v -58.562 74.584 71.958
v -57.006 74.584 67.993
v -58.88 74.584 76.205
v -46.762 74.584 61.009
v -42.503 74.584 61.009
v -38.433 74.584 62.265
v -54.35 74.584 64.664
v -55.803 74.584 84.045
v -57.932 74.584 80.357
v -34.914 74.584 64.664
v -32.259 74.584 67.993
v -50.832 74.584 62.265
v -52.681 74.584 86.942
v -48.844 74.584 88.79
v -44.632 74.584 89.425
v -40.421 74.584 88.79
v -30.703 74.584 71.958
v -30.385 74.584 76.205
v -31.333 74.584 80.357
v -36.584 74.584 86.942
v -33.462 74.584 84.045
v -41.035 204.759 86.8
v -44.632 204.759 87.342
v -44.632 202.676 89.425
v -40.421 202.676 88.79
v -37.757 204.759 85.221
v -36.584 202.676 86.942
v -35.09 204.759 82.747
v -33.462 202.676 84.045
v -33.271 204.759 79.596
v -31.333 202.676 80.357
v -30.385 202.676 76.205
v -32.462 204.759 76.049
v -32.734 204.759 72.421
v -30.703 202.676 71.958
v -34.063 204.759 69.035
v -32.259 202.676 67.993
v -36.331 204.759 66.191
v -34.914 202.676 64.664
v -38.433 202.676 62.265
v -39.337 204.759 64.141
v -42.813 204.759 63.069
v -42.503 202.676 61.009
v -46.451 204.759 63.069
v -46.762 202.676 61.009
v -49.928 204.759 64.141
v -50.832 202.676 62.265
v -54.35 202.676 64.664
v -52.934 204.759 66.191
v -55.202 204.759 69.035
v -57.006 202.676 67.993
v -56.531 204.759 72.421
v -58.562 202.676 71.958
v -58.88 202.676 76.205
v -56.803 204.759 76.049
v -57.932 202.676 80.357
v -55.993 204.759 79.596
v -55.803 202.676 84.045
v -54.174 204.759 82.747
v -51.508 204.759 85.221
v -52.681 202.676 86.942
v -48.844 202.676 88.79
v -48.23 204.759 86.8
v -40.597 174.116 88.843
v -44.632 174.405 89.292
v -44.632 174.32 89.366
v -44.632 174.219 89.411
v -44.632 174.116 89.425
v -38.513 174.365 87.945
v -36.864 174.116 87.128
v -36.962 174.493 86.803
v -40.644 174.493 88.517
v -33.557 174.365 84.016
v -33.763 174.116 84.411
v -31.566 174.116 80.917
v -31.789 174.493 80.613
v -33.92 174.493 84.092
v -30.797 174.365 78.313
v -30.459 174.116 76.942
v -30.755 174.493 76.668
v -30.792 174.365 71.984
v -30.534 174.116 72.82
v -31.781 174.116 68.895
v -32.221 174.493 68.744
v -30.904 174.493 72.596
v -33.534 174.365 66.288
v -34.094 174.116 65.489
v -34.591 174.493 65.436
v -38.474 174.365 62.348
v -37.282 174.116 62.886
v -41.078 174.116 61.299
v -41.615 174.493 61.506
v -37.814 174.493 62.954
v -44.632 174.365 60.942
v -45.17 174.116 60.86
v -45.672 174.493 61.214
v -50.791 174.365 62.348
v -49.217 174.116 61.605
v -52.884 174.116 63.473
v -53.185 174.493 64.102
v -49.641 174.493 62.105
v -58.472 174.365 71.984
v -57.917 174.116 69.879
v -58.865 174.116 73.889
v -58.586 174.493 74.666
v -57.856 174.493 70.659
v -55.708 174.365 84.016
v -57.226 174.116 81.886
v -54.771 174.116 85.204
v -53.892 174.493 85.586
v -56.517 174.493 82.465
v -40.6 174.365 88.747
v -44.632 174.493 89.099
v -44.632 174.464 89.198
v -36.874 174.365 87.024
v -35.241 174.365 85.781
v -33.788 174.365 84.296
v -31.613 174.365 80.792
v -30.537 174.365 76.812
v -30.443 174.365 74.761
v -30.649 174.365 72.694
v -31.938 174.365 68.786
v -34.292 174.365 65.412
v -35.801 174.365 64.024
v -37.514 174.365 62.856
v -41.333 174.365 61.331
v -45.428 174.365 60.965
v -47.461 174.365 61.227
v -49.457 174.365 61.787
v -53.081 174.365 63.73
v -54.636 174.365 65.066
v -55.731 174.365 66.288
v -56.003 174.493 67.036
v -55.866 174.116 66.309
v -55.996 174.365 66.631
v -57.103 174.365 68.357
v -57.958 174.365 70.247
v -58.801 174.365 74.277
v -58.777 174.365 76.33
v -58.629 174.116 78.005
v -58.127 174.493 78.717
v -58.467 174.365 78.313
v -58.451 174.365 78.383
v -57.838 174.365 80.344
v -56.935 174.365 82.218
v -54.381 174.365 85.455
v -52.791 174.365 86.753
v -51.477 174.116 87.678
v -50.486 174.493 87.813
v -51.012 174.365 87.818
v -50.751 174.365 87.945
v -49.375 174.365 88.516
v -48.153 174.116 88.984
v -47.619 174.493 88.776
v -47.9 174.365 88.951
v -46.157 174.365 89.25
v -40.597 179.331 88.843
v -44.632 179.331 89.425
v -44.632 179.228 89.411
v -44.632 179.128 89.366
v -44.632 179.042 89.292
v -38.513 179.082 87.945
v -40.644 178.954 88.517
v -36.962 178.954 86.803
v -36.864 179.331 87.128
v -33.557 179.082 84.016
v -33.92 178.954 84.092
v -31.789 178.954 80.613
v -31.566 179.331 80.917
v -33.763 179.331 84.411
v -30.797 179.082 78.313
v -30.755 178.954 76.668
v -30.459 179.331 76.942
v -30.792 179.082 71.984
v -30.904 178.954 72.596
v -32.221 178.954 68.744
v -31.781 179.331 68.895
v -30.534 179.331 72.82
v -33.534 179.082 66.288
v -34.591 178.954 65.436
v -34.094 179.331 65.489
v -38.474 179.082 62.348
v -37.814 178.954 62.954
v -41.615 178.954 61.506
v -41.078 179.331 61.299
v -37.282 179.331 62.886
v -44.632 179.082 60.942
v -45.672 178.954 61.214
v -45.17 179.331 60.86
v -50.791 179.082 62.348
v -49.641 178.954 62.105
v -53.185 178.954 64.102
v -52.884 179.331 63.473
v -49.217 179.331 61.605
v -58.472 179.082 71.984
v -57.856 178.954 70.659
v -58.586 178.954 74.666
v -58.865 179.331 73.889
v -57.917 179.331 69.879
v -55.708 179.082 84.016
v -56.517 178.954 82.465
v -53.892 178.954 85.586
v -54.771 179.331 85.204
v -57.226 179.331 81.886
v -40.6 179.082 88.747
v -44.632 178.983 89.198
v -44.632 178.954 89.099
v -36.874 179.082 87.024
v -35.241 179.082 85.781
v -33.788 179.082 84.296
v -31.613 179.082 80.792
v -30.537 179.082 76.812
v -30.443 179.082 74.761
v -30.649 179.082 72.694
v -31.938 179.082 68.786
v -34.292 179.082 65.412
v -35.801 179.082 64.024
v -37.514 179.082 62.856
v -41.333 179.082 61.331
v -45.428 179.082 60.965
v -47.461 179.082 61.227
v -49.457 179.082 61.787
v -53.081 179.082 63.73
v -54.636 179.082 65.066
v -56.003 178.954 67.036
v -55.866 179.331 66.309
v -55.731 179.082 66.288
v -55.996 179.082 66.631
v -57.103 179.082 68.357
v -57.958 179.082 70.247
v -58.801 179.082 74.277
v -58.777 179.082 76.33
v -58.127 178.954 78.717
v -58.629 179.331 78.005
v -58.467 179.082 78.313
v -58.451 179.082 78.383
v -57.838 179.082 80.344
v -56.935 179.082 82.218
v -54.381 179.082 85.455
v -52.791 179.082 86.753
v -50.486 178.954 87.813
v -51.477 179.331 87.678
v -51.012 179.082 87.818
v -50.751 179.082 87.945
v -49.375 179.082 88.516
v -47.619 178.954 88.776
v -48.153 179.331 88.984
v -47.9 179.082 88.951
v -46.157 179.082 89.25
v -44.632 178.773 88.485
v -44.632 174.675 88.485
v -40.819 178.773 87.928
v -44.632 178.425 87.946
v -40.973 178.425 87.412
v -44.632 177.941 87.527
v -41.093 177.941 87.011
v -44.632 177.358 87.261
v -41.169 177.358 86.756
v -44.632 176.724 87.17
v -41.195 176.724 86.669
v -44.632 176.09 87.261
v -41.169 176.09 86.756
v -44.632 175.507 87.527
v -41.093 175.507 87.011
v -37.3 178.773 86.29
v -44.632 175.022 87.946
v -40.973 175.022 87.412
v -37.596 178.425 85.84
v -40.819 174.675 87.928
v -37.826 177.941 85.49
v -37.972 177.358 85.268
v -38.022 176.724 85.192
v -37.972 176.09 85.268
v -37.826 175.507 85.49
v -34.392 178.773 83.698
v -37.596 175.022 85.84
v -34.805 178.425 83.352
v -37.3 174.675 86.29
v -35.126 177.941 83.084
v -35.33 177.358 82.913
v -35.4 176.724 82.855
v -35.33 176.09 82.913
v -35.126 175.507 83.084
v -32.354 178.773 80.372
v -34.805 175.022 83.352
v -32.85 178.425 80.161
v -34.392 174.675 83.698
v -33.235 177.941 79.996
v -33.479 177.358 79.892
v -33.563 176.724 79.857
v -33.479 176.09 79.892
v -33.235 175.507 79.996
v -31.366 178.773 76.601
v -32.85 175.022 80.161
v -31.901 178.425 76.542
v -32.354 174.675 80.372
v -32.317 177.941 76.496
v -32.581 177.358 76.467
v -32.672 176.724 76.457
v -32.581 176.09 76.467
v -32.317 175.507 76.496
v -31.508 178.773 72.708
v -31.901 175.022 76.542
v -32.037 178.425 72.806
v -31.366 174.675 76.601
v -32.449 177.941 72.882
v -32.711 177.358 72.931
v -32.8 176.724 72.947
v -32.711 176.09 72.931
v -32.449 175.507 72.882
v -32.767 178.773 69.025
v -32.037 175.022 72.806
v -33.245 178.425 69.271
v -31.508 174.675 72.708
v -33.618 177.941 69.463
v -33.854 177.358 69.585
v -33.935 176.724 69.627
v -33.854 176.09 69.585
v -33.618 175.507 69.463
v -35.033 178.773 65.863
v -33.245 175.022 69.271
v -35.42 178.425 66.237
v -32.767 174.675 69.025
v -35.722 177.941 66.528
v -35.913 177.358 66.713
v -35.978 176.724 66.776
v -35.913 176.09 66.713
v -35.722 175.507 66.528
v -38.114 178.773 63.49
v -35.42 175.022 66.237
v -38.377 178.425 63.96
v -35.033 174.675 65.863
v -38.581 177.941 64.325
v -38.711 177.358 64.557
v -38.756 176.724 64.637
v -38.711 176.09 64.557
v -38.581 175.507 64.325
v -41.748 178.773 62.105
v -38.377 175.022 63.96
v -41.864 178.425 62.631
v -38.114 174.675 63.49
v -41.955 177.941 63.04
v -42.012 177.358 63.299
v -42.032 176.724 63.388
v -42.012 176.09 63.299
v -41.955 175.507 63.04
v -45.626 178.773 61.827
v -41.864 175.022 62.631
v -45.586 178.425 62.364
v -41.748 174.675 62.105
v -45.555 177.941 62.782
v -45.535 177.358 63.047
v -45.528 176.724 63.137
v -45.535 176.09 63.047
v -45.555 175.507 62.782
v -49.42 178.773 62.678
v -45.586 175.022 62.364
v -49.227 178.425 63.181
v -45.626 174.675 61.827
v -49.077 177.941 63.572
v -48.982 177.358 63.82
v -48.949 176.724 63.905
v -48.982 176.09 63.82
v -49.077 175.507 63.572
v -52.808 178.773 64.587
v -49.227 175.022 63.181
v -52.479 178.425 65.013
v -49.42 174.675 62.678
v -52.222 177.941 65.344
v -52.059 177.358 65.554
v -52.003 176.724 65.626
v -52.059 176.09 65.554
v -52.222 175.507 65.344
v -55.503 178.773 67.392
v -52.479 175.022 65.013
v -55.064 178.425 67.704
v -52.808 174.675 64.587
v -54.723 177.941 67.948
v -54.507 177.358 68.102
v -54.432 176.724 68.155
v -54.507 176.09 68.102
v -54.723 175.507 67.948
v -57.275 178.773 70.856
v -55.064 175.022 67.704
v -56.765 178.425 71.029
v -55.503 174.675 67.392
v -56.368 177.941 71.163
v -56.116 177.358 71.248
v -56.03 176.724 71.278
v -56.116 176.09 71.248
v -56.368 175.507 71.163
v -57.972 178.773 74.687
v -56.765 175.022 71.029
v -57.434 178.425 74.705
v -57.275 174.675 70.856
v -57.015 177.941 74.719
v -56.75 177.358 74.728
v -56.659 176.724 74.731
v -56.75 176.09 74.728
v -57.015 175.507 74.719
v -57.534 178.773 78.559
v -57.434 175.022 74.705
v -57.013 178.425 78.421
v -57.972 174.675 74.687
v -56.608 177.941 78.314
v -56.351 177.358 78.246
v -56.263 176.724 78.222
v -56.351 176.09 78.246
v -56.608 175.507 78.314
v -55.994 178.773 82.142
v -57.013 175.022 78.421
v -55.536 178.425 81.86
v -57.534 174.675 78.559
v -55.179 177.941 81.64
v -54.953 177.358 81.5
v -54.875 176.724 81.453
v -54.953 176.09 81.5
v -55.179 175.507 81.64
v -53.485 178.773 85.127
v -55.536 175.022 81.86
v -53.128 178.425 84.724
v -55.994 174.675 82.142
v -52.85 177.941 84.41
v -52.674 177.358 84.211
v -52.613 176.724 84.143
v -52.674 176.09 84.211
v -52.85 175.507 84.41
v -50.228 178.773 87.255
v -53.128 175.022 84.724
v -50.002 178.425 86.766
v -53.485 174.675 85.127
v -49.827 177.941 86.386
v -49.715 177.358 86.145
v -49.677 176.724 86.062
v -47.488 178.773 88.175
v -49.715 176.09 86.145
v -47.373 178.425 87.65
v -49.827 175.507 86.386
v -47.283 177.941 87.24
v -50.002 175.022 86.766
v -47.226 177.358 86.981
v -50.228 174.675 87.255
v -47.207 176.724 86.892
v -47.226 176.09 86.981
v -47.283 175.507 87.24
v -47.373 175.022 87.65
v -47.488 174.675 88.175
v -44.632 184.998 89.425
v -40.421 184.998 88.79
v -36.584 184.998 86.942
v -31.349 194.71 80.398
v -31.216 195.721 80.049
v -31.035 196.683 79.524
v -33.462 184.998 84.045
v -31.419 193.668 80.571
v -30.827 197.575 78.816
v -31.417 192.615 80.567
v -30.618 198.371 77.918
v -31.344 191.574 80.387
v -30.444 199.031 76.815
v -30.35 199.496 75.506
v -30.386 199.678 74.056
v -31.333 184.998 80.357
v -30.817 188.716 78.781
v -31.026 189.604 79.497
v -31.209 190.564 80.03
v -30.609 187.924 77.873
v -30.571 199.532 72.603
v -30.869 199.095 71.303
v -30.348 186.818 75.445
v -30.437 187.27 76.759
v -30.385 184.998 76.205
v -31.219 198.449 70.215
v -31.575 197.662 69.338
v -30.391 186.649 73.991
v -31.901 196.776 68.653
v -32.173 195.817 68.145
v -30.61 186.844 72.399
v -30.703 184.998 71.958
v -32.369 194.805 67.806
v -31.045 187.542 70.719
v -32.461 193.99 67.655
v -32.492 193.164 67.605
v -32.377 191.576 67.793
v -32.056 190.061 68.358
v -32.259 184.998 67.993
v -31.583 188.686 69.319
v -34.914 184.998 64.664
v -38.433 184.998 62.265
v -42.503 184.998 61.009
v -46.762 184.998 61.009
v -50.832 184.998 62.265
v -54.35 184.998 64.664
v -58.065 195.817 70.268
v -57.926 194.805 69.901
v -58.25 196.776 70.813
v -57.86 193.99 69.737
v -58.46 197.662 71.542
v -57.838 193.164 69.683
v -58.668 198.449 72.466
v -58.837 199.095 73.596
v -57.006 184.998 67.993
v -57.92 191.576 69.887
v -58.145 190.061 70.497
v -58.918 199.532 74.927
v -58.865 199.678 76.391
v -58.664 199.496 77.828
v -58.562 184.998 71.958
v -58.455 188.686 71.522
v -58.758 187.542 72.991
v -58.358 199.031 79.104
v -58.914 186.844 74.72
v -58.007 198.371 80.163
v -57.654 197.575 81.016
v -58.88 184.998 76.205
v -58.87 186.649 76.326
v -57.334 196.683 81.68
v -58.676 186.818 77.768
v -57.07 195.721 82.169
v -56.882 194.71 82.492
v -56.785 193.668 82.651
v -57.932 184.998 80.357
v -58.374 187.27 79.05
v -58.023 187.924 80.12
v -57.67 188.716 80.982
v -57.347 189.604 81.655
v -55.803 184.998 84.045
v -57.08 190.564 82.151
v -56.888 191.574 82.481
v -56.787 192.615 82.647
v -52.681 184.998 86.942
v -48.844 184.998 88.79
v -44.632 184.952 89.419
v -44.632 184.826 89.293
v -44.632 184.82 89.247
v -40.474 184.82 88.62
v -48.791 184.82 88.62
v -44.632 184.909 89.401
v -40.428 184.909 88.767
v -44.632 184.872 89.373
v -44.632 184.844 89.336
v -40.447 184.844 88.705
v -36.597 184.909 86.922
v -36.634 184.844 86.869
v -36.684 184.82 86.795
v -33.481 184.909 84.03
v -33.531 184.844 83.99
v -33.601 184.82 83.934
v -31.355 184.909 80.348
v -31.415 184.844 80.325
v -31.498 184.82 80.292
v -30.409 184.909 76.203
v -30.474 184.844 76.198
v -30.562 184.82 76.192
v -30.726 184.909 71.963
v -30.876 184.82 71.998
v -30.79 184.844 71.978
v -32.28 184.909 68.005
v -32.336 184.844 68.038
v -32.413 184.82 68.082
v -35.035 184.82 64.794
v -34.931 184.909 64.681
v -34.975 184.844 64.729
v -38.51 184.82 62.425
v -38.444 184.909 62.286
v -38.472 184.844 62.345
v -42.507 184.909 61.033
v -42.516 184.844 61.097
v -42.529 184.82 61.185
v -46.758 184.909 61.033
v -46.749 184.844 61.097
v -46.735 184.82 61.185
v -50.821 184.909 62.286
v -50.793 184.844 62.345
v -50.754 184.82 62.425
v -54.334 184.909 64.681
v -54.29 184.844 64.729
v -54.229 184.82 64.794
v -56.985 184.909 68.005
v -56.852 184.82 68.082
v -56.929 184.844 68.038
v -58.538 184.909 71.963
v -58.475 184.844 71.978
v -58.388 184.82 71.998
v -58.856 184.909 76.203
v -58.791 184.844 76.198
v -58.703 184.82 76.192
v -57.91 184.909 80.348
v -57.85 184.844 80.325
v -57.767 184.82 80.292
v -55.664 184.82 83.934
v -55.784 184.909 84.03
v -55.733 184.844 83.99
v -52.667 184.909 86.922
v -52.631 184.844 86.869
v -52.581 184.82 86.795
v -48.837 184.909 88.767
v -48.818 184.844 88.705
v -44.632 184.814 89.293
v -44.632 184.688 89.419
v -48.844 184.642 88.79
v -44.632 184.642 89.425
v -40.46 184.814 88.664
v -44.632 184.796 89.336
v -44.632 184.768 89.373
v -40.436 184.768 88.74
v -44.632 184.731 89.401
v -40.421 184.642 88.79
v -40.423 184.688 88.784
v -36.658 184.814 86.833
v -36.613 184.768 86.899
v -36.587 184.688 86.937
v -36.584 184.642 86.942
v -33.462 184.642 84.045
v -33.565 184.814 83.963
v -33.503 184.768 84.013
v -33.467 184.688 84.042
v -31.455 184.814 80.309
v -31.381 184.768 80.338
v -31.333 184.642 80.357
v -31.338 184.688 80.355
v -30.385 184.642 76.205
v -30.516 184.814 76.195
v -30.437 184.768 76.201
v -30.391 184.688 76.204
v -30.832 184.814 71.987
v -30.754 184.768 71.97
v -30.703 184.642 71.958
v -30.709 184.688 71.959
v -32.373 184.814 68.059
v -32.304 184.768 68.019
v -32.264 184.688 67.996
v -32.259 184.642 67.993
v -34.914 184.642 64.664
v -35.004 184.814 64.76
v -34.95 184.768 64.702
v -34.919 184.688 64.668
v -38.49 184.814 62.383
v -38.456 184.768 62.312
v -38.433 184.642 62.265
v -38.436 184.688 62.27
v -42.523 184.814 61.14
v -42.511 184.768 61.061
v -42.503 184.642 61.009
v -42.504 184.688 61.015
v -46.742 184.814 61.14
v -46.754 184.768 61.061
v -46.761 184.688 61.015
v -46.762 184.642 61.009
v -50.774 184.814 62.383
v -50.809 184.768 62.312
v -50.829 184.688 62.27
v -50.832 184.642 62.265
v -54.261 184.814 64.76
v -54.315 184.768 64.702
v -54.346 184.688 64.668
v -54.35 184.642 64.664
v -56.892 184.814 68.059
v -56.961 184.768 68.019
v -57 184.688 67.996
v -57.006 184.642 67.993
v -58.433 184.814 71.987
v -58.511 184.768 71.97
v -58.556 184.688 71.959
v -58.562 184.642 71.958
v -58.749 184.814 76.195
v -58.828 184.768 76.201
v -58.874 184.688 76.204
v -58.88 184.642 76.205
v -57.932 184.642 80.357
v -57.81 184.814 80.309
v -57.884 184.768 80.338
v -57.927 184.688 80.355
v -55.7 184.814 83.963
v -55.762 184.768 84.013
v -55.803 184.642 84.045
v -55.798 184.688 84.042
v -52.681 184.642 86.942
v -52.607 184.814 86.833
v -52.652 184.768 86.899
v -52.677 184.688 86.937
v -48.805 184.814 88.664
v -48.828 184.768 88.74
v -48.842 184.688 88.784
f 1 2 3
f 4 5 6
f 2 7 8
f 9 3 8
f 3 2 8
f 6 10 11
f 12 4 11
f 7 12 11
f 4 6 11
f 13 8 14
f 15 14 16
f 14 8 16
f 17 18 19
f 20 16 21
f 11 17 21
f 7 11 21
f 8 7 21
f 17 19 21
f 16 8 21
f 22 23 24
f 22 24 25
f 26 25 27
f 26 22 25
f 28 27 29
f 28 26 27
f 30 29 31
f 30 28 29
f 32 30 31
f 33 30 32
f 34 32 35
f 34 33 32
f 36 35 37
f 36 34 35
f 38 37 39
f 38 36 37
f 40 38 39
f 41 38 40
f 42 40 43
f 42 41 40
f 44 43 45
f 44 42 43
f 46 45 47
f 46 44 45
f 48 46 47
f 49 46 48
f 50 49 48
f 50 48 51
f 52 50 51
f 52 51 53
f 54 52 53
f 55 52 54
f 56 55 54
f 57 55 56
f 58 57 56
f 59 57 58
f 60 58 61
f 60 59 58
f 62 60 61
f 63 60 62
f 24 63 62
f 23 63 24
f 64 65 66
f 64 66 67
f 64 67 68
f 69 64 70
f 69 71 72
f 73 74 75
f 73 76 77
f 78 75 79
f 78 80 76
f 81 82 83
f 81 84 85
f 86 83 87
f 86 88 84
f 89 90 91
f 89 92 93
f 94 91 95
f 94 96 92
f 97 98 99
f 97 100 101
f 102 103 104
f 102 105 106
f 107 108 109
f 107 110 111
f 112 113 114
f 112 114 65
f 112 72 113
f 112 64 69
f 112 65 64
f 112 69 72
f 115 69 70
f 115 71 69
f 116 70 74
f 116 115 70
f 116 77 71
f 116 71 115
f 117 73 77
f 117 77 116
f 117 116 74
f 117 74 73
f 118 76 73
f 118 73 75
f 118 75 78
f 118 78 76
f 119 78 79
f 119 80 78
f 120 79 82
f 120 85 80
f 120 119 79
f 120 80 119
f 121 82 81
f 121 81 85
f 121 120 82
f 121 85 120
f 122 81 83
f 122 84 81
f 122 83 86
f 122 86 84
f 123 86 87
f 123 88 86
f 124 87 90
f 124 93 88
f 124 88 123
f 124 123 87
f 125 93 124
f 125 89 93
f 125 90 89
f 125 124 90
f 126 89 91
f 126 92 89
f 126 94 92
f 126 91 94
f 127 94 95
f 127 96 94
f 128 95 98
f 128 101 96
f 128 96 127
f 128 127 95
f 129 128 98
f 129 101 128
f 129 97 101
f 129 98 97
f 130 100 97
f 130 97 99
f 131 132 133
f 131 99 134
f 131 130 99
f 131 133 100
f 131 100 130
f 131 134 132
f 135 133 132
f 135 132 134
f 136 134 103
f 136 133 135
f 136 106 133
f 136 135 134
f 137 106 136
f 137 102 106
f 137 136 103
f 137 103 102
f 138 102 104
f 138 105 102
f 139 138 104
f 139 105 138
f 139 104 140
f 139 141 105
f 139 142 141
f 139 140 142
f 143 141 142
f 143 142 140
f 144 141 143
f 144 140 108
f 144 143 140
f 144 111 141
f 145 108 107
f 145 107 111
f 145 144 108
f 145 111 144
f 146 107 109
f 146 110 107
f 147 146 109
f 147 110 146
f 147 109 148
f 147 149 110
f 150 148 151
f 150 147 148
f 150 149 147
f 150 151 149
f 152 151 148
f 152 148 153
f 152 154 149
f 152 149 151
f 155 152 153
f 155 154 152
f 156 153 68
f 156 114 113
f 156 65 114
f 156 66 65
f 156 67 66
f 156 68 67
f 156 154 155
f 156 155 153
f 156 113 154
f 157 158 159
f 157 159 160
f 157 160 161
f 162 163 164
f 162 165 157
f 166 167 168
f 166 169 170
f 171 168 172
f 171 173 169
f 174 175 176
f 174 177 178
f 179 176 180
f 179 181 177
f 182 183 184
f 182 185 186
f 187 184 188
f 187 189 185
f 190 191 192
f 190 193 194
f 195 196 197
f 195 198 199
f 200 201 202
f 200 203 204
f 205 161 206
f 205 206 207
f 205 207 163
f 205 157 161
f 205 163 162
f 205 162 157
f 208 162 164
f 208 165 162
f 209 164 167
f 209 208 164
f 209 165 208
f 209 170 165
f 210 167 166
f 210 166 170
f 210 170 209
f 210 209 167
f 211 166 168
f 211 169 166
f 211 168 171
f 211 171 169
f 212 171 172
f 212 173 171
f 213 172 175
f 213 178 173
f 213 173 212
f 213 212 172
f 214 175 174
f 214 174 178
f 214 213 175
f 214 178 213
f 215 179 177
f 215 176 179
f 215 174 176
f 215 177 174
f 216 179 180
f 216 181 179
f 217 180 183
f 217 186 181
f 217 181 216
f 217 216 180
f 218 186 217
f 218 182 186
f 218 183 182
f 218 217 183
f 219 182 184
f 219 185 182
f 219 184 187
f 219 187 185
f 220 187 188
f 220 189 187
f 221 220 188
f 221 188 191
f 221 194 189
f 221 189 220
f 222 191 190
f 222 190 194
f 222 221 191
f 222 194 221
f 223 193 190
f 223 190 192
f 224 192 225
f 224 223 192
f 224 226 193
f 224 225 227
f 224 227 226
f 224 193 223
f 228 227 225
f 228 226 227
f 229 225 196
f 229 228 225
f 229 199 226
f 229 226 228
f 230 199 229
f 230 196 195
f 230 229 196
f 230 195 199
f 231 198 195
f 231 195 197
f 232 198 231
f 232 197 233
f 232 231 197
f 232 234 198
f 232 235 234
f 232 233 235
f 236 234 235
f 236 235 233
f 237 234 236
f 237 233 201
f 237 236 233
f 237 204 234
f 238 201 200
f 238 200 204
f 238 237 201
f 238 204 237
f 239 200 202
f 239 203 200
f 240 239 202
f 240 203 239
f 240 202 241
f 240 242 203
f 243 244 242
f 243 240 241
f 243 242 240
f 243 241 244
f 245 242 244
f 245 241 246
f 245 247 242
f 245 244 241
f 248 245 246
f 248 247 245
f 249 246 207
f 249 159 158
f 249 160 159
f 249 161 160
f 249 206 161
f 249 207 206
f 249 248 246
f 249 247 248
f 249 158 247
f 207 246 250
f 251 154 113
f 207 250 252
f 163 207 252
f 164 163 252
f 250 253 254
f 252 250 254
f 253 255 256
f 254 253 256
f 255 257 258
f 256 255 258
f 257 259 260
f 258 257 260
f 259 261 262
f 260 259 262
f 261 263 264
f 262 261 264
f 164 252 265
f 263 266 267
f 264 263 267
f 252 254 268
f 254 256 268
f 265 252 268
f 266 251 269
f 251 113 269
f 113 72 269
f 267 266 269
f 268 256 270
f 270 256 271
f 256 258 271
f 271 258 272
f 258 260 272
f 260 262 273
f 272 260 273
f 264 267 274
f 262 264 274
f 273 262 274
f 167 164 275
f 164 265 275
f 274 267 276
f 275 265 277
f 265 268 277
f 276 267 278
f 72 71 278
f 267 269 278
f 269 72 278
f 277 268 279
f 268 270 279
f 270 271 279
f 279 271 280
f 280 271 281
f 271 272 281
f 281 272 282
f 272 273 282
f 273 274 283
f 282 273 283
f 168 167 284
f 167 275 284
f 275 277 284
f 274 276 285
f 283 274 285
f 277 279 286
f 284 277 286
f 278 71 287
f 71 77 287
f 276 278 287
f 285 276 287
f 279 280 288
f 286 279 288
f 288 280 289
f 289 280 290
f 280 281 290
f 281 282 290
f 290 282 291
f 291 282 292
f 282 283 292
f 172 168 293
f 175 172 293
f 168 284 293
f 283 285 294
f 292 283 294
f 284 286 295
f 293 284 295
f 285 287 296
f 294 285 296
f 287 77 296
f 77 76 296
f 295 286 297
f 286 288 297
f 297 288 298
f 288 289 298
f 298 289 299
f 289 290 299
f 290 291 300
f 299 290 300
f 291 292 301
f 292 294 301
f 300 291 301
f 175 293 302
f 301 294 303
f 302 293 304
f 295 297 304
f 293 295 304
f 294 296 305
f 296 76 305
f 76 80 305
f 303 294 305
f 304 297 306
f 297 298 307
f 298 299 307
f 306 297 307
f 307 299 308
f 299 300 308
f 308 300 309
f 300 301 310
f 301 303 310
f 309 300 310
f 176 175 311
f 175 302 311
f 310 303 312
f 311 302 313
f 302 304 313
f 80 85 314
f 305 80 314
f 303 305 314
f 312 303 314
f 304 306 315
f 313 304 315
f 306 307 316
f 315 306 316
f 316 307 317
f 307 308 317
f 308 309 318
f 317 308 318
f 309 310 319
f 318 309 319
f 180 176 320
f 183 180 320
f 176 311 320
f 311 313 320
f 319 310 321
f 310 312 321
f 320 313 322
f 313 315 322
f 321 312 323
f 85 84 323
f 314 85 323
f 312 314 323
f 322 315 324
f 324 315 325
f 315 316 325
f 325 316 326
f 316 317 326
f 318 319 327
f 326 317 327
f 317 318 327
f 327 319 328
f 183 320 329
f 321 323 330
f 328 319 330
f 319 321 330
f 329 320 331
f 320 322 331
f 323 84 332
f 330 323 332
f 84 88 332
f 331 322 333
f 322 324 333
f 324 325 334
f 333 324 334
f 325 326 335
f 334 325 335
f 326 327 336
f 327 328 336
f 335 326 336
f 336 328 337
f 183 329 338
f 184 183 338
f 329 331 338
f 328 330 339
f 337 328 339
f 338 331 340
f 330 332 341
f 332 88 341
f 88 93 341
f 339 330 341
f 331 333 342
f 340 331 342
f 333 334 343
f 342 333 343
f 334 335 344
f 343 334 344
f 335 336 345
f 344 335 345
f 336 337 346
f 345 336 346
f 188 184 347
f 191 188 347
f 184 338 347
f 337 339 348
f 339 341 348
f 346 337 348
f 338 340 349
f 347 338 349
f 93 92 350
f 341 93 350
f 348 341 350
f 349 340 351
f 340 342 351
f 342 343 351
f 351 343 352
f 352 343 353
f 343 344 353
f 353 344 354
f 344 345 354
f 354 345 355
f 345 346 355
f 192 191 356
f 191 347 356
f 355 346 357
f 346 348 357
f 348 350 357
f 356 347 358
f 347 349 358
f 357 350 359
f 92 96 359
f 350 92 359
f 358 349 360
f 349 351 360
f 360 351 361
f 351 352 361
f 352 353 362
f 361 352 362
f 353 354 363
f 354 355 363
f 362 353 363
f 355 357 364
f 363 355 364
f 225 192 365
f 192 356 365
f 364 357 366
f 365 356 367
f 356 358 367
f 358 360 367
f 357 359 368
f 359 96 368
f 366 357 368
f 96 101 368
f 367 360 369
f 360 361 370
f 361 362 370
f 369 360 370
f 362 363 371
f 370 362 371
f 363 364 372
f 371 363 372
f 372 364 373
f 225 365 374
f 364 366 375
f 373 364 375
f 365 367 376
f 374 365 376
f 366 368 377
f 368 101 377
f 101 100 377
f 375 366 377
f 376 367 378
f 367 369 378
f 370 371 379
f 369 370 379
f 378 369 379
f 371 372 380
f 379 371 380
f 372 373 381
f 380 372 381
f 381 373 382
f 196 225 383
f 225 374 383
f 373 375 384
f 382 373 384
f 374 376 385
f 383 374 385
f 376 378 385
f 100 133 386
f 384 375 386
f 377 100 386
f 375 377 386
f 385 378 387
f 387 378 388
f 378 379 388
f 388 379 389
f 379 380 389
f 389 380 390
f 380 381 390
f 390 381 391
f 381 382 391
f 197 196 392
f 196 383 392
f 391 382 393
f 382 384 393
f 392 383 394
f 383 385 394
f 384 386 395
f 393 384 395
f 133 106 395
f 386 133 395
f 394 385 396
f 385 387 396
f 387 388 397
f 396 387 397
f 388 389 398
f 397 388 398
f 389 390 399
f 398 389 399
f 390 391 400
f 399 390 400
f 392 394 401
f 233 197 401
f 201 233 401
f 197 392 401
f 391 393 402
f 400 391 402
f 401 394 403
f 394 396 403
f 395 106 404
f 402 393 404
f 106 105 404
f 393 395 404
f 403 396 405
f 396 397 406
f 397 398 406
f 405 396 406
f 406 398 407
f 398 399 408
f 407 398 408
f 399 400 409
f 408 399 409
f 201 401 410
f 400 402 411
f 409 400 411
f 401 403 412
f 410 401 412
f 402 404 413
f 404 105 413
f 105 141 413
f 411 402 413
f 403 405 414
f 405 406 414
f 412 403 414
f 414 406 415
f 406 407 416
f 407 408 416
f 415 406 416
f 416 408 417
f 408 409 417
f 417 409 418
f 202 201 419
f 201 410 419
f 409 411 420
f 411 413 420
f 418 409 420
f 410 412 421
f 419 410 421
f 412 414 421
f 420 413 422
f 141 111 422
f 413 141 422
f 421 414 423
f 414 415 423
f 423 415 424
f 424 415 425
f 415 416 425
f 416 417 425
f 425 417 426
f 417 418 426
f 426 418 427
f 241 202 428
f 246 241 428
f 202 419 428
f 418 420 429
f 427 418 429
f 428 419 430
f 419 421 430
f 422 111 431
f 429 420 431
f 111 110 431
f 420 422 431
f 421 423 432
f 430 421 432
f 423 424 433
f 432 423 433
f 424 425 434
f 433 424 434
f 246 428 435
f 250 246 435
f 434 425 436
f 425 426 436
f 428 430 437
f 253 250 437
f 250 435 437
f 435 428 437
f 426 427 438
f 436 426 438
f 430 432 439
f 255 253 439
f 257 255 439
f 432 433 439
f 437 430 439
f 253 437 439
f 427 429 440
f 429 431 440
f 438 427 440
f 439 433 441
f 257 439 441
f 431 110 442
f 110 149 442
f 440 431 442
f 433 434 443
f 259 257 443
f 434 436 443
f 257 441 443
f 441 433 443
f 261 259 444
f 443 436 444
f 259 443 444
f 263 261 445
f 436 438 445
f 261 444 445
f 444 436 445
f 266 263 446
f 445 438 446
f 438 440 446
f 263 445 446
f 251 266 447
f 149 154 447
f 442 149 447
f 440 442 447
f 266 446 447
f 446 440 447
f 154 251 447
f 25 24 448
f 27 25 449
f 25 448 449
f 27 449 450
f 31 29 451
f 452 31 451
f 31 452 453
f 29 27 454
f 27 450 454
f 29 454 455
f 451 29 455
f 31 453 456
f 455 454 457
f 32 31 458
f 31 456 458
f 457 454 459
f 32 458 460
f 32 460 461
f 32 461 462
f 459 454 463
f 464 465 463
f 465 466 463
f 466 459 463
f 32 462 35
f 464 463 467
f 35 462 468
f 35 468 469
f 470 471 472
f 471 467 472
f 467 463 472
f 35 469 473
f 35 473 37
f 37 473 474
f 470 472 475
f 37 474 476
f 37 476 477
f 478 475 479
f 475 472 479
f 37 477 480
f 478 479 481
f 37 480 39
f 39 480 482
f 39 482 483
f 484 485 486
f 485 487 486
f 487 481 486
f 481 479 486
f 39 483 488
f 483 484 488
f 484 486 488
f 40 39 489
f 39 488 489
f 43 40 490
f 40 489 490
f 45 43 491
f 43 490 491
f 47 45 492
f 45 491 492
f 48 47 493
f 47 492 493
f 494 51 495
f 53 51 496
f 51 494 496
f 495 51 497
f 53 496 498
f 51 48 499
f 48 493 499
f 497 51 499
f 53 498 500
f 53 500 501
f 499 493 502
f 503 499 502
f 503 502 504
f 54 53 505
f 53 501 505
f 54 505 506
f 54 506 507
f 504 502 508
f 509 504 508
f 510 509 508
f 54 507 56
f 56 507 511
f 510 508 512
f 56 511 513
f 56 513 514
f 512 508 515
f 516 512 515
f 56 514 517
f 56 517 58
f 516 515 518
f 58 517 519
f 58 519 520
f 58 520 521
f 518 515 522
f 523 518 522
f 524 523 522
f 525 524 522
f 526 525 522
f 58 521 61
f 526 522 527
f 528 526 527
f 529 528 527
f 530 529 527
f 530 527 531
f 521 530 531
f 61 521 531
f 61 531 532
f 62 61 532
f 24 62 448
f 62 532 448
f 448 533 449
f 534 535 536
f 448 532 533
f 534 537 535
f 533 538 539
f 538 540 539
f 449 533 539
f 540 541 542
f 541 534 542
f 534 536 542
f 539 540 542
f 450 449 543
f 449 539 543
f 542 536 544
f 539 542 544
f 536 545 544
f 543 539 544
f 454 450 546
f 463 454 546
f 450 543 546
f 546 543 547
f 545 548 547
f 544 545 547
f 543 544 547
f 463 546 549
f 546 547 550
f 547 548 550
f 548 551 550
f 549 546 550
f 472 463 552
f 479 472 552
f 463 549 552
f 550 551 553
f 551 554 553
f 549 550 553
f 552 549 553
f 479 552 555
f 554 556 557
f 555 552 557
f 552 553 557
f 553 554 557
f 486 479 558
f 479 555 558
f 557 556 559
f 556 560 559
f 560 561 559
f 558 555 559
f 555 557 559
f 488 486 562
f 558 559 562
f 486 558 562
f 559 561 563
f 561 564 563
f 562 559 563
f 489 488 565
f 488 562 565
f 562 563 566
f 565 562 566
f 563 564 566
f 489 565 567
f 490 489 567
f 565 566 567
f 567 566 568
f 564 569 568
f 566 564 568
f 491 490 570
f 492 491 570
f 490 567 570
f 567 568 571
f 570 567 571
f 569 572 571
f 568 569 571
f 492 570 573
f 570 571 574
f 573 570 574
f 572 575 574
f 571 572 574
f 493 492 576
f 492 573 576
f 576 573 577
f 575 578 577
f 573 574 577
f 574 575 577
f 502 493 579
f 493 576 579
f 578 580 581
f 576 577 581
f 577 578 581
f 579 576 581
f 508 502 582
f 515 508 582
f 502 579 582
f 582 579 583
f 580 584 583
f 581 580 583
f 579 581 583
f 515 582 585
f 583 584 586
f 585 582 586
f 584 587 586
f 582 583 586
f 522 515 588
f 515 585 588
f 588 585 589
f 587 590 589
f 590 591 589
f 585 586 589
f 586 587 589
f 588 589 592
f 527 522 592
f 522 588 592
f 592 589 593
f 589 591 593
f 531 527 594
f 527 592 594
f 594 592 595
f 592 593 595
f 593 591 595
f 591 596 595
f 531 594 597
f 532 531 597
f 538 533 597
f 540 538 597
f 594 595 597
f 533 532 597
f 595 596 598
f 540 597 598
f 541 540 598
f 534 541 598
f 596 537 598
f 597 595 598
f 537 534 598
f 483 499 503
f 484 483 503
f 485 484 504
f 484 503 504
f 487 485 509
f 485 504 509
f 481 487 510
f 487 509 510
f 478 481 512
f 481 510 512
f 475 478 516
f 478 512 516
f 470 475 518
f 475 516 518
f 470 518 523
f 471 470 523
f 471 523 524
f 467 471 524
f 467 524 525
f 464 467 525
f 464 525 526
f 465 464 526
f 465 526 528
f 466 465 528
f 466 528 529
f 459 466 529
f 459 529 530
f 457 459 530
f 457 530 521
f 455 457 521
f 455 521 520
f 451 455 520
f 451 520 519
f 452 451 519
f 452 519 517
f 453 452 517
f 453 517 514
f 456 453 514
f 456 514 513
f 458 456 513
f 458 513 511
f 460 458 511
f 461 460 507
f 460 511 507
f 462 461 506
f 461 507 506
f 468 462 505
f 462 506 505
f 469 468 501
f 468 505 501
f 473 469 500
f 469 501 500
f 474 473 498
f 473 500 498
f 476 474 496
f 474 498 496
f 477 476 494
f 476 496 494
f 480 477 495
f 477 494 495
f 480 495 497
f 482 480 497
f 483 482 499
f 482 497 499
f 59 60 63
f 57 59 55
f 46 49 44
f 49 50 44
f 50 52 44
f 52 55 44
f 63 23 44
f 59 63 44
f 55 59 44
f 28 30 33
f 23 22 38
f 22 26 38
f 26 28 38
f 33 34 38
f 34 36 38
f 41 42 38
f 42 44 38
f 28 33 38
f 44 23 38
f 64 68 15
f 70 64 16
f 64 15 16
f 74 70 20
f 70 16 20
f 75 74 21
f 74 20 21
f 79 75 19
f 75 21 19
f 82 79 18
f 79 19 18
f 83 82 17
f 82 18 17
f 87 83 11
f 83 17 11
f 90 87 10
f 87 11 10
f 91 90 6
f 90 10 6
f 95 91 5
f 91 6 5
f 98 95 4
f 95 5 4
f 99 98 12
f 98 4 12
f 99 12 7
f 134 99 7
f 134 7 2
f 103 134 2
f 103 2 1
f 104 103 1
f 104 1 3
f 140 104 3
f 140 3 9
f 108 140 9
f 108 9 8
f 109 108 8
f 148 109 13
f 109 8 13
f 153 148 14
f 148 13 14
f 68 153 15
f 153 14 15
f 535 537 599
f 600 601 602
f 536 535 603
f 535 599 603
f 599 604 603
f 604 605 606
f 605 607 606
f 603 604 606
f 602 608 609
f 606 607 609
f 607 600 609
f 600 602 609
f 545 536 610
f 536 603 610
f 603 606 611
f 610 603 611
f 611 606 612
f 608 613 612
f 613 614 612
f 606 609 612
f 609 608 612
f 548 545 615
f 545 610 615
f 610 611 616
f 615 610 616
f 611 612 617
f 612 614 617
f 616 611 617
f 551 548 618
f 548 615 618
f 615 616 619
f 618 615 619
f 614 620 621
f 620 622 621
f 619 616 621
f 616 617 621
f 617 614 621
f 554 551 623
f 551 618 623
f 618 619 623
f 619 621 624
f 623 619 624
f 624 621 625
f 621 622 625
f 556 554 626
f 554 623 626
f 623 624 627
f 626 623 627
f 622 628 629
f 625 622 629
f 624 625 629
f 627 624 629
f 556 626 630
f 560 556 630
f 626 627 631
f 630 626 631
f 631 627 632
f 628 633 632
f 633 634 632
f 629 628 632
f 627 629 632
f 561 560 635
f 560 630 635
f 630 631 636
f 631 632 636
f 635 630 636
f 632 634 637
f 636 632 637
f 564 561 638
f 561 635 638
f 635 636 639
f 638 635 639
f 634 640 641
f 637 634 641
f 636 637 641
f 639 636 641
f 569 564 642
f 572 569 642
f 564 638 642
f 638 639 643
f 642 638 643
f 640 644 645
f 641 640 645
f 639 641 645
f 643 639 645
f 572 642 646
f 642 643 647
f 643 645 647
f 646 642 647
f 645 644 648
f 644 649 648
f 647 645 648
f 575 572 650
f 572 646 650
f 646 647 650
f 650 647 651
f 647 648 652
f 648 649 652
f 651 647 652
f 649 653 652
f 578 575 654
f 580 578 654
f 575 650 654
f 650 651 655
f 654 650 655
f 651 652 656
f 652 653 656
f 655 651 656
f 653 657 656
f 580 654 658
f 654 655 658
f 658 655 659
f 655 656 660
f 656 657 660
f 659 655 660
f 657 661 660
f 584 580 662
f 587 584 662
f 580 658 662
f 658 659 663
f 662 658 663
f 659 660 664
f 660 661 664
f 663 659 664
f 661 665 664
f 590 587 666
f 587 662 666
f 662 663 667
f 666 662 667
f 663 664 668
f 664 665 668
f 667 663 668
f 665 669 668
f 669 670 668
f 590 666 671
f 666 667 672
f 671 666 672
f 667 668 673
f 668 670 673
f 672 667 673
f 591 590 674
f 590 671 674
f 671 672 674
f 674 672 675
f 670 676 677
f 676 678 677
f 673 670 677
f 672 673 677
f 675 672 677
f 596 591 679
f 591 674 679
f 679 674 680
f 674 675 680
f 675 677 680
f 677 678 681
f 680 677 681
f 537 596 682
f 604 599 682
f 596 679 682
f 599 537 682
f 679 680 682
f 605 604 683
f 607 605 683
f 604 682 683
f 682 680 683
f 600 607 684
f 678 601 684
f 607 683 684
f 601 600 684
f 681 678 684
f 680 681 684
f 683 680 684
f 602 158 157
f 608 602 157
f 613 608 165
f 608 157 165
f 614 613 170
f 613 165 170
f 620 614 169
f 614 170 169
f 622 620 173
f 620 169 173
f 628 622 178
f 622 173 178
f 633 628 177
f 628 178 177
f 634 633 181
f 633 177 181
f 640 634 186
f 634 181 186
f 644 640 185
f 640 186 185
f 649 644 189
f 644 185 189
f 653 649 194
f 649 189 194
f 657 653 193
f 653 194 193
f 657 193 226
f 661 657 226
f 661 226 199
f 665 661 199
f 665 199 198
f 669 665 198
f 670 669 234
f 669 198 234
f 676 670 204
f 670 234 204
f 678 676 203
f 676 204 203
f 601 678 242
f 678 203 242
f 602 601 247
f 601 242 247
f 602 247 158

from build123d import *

# Parameters (mm, degrees)
M12_CLEARANCE_HOLE1_D     = 13.0302
M12_CLEARANCE_HOLE1_DEPTH = 29.694674762
CHAMFER2_SIZE             = 2.0828
FILLET1_R                 = 0.381


with BuildPart() as part:
    # Sketch1 → Revolve1 (revolve)
    with BuildSketch(Plane(origin=(0, 0, 75.137205399), x_dir=(-1, 0, 0), z_dir=(0, 0, -1)), mode=Mode.PRIVATE) as revolve1_sk:
        with BuildLine():
            Line((30.344908621, 74.583941634), (44.632408621, 74.583941634))
            Line((44.632408621, 74.583941634), (44.632408621, 204.758941634))
            Line((44.632408621, 204.758941634), (30.344908621, 204.758941634))
            Line((30.344908621, 204.758941634), (30.344908621, 184.997741634))
            ThreePointArc((30.344908621, 184.997741634), (30.396985036, 184.872018048), (30.522708621, 184.819941634))
            ThreePointArc((30.522708621, 184.819941634), (30.396985036, 184.767865219), (30.344908621, 184.642141634))
            Line((30.344908621, 184.642141634), (30.344908621, 178.977941634))
            ThreePointArc((30.344908621, 178.977941634), (32.599158621, 176.723691634), (30.344908621, 174.469441634))
            Line((30.344908621, 174.469441634), (30.344908621, 74.583941634))
        make_face()
    revolve(revolve1_sk.sketch.rotate(Axis((-44.632408621, 74.583941634, 75.137205399), (0, 1, 0)), 270), axis=Axis((-44.632408621, 74.583941634, 75.137205399), (0, 1, 0)))

    # M12 Clearance Hole1
    with Locations(Plane(origin=(-30.392685563, 193.163841634, 73.969753695), x_dir=(0.081711405341, 0, 0.996656032058), z_dir=(0.996656032058, 0, -0.081711405341))):
        with Locations((0, 0)):
            Hole(M12_CLEARANCE_HOLE1_D / 2, depth=M12_CLEARANCE_HOLE1_DEPTH)

    # Chamfer2
    chamfer2_edges = [part.edges().sort_by_distance(p)[0] for p in [
        (-44.632408621, 204.758941634, 60.849705399),
    ]]
    chamfer(chamfer2_edges, length=CHAMFER2_SIZE)

    # Fillet1
    fillet1_edges = [part.edges().sort_by_distance(p)[0] for p in [
        (-44.632408621, 174.469441634, 60.849705399),
        (-44.632408621, 178.977941634, 60.849705399),
    ]]
    fillet(fillet1_edges, radius=FILLET1_R)


solid = part.part
